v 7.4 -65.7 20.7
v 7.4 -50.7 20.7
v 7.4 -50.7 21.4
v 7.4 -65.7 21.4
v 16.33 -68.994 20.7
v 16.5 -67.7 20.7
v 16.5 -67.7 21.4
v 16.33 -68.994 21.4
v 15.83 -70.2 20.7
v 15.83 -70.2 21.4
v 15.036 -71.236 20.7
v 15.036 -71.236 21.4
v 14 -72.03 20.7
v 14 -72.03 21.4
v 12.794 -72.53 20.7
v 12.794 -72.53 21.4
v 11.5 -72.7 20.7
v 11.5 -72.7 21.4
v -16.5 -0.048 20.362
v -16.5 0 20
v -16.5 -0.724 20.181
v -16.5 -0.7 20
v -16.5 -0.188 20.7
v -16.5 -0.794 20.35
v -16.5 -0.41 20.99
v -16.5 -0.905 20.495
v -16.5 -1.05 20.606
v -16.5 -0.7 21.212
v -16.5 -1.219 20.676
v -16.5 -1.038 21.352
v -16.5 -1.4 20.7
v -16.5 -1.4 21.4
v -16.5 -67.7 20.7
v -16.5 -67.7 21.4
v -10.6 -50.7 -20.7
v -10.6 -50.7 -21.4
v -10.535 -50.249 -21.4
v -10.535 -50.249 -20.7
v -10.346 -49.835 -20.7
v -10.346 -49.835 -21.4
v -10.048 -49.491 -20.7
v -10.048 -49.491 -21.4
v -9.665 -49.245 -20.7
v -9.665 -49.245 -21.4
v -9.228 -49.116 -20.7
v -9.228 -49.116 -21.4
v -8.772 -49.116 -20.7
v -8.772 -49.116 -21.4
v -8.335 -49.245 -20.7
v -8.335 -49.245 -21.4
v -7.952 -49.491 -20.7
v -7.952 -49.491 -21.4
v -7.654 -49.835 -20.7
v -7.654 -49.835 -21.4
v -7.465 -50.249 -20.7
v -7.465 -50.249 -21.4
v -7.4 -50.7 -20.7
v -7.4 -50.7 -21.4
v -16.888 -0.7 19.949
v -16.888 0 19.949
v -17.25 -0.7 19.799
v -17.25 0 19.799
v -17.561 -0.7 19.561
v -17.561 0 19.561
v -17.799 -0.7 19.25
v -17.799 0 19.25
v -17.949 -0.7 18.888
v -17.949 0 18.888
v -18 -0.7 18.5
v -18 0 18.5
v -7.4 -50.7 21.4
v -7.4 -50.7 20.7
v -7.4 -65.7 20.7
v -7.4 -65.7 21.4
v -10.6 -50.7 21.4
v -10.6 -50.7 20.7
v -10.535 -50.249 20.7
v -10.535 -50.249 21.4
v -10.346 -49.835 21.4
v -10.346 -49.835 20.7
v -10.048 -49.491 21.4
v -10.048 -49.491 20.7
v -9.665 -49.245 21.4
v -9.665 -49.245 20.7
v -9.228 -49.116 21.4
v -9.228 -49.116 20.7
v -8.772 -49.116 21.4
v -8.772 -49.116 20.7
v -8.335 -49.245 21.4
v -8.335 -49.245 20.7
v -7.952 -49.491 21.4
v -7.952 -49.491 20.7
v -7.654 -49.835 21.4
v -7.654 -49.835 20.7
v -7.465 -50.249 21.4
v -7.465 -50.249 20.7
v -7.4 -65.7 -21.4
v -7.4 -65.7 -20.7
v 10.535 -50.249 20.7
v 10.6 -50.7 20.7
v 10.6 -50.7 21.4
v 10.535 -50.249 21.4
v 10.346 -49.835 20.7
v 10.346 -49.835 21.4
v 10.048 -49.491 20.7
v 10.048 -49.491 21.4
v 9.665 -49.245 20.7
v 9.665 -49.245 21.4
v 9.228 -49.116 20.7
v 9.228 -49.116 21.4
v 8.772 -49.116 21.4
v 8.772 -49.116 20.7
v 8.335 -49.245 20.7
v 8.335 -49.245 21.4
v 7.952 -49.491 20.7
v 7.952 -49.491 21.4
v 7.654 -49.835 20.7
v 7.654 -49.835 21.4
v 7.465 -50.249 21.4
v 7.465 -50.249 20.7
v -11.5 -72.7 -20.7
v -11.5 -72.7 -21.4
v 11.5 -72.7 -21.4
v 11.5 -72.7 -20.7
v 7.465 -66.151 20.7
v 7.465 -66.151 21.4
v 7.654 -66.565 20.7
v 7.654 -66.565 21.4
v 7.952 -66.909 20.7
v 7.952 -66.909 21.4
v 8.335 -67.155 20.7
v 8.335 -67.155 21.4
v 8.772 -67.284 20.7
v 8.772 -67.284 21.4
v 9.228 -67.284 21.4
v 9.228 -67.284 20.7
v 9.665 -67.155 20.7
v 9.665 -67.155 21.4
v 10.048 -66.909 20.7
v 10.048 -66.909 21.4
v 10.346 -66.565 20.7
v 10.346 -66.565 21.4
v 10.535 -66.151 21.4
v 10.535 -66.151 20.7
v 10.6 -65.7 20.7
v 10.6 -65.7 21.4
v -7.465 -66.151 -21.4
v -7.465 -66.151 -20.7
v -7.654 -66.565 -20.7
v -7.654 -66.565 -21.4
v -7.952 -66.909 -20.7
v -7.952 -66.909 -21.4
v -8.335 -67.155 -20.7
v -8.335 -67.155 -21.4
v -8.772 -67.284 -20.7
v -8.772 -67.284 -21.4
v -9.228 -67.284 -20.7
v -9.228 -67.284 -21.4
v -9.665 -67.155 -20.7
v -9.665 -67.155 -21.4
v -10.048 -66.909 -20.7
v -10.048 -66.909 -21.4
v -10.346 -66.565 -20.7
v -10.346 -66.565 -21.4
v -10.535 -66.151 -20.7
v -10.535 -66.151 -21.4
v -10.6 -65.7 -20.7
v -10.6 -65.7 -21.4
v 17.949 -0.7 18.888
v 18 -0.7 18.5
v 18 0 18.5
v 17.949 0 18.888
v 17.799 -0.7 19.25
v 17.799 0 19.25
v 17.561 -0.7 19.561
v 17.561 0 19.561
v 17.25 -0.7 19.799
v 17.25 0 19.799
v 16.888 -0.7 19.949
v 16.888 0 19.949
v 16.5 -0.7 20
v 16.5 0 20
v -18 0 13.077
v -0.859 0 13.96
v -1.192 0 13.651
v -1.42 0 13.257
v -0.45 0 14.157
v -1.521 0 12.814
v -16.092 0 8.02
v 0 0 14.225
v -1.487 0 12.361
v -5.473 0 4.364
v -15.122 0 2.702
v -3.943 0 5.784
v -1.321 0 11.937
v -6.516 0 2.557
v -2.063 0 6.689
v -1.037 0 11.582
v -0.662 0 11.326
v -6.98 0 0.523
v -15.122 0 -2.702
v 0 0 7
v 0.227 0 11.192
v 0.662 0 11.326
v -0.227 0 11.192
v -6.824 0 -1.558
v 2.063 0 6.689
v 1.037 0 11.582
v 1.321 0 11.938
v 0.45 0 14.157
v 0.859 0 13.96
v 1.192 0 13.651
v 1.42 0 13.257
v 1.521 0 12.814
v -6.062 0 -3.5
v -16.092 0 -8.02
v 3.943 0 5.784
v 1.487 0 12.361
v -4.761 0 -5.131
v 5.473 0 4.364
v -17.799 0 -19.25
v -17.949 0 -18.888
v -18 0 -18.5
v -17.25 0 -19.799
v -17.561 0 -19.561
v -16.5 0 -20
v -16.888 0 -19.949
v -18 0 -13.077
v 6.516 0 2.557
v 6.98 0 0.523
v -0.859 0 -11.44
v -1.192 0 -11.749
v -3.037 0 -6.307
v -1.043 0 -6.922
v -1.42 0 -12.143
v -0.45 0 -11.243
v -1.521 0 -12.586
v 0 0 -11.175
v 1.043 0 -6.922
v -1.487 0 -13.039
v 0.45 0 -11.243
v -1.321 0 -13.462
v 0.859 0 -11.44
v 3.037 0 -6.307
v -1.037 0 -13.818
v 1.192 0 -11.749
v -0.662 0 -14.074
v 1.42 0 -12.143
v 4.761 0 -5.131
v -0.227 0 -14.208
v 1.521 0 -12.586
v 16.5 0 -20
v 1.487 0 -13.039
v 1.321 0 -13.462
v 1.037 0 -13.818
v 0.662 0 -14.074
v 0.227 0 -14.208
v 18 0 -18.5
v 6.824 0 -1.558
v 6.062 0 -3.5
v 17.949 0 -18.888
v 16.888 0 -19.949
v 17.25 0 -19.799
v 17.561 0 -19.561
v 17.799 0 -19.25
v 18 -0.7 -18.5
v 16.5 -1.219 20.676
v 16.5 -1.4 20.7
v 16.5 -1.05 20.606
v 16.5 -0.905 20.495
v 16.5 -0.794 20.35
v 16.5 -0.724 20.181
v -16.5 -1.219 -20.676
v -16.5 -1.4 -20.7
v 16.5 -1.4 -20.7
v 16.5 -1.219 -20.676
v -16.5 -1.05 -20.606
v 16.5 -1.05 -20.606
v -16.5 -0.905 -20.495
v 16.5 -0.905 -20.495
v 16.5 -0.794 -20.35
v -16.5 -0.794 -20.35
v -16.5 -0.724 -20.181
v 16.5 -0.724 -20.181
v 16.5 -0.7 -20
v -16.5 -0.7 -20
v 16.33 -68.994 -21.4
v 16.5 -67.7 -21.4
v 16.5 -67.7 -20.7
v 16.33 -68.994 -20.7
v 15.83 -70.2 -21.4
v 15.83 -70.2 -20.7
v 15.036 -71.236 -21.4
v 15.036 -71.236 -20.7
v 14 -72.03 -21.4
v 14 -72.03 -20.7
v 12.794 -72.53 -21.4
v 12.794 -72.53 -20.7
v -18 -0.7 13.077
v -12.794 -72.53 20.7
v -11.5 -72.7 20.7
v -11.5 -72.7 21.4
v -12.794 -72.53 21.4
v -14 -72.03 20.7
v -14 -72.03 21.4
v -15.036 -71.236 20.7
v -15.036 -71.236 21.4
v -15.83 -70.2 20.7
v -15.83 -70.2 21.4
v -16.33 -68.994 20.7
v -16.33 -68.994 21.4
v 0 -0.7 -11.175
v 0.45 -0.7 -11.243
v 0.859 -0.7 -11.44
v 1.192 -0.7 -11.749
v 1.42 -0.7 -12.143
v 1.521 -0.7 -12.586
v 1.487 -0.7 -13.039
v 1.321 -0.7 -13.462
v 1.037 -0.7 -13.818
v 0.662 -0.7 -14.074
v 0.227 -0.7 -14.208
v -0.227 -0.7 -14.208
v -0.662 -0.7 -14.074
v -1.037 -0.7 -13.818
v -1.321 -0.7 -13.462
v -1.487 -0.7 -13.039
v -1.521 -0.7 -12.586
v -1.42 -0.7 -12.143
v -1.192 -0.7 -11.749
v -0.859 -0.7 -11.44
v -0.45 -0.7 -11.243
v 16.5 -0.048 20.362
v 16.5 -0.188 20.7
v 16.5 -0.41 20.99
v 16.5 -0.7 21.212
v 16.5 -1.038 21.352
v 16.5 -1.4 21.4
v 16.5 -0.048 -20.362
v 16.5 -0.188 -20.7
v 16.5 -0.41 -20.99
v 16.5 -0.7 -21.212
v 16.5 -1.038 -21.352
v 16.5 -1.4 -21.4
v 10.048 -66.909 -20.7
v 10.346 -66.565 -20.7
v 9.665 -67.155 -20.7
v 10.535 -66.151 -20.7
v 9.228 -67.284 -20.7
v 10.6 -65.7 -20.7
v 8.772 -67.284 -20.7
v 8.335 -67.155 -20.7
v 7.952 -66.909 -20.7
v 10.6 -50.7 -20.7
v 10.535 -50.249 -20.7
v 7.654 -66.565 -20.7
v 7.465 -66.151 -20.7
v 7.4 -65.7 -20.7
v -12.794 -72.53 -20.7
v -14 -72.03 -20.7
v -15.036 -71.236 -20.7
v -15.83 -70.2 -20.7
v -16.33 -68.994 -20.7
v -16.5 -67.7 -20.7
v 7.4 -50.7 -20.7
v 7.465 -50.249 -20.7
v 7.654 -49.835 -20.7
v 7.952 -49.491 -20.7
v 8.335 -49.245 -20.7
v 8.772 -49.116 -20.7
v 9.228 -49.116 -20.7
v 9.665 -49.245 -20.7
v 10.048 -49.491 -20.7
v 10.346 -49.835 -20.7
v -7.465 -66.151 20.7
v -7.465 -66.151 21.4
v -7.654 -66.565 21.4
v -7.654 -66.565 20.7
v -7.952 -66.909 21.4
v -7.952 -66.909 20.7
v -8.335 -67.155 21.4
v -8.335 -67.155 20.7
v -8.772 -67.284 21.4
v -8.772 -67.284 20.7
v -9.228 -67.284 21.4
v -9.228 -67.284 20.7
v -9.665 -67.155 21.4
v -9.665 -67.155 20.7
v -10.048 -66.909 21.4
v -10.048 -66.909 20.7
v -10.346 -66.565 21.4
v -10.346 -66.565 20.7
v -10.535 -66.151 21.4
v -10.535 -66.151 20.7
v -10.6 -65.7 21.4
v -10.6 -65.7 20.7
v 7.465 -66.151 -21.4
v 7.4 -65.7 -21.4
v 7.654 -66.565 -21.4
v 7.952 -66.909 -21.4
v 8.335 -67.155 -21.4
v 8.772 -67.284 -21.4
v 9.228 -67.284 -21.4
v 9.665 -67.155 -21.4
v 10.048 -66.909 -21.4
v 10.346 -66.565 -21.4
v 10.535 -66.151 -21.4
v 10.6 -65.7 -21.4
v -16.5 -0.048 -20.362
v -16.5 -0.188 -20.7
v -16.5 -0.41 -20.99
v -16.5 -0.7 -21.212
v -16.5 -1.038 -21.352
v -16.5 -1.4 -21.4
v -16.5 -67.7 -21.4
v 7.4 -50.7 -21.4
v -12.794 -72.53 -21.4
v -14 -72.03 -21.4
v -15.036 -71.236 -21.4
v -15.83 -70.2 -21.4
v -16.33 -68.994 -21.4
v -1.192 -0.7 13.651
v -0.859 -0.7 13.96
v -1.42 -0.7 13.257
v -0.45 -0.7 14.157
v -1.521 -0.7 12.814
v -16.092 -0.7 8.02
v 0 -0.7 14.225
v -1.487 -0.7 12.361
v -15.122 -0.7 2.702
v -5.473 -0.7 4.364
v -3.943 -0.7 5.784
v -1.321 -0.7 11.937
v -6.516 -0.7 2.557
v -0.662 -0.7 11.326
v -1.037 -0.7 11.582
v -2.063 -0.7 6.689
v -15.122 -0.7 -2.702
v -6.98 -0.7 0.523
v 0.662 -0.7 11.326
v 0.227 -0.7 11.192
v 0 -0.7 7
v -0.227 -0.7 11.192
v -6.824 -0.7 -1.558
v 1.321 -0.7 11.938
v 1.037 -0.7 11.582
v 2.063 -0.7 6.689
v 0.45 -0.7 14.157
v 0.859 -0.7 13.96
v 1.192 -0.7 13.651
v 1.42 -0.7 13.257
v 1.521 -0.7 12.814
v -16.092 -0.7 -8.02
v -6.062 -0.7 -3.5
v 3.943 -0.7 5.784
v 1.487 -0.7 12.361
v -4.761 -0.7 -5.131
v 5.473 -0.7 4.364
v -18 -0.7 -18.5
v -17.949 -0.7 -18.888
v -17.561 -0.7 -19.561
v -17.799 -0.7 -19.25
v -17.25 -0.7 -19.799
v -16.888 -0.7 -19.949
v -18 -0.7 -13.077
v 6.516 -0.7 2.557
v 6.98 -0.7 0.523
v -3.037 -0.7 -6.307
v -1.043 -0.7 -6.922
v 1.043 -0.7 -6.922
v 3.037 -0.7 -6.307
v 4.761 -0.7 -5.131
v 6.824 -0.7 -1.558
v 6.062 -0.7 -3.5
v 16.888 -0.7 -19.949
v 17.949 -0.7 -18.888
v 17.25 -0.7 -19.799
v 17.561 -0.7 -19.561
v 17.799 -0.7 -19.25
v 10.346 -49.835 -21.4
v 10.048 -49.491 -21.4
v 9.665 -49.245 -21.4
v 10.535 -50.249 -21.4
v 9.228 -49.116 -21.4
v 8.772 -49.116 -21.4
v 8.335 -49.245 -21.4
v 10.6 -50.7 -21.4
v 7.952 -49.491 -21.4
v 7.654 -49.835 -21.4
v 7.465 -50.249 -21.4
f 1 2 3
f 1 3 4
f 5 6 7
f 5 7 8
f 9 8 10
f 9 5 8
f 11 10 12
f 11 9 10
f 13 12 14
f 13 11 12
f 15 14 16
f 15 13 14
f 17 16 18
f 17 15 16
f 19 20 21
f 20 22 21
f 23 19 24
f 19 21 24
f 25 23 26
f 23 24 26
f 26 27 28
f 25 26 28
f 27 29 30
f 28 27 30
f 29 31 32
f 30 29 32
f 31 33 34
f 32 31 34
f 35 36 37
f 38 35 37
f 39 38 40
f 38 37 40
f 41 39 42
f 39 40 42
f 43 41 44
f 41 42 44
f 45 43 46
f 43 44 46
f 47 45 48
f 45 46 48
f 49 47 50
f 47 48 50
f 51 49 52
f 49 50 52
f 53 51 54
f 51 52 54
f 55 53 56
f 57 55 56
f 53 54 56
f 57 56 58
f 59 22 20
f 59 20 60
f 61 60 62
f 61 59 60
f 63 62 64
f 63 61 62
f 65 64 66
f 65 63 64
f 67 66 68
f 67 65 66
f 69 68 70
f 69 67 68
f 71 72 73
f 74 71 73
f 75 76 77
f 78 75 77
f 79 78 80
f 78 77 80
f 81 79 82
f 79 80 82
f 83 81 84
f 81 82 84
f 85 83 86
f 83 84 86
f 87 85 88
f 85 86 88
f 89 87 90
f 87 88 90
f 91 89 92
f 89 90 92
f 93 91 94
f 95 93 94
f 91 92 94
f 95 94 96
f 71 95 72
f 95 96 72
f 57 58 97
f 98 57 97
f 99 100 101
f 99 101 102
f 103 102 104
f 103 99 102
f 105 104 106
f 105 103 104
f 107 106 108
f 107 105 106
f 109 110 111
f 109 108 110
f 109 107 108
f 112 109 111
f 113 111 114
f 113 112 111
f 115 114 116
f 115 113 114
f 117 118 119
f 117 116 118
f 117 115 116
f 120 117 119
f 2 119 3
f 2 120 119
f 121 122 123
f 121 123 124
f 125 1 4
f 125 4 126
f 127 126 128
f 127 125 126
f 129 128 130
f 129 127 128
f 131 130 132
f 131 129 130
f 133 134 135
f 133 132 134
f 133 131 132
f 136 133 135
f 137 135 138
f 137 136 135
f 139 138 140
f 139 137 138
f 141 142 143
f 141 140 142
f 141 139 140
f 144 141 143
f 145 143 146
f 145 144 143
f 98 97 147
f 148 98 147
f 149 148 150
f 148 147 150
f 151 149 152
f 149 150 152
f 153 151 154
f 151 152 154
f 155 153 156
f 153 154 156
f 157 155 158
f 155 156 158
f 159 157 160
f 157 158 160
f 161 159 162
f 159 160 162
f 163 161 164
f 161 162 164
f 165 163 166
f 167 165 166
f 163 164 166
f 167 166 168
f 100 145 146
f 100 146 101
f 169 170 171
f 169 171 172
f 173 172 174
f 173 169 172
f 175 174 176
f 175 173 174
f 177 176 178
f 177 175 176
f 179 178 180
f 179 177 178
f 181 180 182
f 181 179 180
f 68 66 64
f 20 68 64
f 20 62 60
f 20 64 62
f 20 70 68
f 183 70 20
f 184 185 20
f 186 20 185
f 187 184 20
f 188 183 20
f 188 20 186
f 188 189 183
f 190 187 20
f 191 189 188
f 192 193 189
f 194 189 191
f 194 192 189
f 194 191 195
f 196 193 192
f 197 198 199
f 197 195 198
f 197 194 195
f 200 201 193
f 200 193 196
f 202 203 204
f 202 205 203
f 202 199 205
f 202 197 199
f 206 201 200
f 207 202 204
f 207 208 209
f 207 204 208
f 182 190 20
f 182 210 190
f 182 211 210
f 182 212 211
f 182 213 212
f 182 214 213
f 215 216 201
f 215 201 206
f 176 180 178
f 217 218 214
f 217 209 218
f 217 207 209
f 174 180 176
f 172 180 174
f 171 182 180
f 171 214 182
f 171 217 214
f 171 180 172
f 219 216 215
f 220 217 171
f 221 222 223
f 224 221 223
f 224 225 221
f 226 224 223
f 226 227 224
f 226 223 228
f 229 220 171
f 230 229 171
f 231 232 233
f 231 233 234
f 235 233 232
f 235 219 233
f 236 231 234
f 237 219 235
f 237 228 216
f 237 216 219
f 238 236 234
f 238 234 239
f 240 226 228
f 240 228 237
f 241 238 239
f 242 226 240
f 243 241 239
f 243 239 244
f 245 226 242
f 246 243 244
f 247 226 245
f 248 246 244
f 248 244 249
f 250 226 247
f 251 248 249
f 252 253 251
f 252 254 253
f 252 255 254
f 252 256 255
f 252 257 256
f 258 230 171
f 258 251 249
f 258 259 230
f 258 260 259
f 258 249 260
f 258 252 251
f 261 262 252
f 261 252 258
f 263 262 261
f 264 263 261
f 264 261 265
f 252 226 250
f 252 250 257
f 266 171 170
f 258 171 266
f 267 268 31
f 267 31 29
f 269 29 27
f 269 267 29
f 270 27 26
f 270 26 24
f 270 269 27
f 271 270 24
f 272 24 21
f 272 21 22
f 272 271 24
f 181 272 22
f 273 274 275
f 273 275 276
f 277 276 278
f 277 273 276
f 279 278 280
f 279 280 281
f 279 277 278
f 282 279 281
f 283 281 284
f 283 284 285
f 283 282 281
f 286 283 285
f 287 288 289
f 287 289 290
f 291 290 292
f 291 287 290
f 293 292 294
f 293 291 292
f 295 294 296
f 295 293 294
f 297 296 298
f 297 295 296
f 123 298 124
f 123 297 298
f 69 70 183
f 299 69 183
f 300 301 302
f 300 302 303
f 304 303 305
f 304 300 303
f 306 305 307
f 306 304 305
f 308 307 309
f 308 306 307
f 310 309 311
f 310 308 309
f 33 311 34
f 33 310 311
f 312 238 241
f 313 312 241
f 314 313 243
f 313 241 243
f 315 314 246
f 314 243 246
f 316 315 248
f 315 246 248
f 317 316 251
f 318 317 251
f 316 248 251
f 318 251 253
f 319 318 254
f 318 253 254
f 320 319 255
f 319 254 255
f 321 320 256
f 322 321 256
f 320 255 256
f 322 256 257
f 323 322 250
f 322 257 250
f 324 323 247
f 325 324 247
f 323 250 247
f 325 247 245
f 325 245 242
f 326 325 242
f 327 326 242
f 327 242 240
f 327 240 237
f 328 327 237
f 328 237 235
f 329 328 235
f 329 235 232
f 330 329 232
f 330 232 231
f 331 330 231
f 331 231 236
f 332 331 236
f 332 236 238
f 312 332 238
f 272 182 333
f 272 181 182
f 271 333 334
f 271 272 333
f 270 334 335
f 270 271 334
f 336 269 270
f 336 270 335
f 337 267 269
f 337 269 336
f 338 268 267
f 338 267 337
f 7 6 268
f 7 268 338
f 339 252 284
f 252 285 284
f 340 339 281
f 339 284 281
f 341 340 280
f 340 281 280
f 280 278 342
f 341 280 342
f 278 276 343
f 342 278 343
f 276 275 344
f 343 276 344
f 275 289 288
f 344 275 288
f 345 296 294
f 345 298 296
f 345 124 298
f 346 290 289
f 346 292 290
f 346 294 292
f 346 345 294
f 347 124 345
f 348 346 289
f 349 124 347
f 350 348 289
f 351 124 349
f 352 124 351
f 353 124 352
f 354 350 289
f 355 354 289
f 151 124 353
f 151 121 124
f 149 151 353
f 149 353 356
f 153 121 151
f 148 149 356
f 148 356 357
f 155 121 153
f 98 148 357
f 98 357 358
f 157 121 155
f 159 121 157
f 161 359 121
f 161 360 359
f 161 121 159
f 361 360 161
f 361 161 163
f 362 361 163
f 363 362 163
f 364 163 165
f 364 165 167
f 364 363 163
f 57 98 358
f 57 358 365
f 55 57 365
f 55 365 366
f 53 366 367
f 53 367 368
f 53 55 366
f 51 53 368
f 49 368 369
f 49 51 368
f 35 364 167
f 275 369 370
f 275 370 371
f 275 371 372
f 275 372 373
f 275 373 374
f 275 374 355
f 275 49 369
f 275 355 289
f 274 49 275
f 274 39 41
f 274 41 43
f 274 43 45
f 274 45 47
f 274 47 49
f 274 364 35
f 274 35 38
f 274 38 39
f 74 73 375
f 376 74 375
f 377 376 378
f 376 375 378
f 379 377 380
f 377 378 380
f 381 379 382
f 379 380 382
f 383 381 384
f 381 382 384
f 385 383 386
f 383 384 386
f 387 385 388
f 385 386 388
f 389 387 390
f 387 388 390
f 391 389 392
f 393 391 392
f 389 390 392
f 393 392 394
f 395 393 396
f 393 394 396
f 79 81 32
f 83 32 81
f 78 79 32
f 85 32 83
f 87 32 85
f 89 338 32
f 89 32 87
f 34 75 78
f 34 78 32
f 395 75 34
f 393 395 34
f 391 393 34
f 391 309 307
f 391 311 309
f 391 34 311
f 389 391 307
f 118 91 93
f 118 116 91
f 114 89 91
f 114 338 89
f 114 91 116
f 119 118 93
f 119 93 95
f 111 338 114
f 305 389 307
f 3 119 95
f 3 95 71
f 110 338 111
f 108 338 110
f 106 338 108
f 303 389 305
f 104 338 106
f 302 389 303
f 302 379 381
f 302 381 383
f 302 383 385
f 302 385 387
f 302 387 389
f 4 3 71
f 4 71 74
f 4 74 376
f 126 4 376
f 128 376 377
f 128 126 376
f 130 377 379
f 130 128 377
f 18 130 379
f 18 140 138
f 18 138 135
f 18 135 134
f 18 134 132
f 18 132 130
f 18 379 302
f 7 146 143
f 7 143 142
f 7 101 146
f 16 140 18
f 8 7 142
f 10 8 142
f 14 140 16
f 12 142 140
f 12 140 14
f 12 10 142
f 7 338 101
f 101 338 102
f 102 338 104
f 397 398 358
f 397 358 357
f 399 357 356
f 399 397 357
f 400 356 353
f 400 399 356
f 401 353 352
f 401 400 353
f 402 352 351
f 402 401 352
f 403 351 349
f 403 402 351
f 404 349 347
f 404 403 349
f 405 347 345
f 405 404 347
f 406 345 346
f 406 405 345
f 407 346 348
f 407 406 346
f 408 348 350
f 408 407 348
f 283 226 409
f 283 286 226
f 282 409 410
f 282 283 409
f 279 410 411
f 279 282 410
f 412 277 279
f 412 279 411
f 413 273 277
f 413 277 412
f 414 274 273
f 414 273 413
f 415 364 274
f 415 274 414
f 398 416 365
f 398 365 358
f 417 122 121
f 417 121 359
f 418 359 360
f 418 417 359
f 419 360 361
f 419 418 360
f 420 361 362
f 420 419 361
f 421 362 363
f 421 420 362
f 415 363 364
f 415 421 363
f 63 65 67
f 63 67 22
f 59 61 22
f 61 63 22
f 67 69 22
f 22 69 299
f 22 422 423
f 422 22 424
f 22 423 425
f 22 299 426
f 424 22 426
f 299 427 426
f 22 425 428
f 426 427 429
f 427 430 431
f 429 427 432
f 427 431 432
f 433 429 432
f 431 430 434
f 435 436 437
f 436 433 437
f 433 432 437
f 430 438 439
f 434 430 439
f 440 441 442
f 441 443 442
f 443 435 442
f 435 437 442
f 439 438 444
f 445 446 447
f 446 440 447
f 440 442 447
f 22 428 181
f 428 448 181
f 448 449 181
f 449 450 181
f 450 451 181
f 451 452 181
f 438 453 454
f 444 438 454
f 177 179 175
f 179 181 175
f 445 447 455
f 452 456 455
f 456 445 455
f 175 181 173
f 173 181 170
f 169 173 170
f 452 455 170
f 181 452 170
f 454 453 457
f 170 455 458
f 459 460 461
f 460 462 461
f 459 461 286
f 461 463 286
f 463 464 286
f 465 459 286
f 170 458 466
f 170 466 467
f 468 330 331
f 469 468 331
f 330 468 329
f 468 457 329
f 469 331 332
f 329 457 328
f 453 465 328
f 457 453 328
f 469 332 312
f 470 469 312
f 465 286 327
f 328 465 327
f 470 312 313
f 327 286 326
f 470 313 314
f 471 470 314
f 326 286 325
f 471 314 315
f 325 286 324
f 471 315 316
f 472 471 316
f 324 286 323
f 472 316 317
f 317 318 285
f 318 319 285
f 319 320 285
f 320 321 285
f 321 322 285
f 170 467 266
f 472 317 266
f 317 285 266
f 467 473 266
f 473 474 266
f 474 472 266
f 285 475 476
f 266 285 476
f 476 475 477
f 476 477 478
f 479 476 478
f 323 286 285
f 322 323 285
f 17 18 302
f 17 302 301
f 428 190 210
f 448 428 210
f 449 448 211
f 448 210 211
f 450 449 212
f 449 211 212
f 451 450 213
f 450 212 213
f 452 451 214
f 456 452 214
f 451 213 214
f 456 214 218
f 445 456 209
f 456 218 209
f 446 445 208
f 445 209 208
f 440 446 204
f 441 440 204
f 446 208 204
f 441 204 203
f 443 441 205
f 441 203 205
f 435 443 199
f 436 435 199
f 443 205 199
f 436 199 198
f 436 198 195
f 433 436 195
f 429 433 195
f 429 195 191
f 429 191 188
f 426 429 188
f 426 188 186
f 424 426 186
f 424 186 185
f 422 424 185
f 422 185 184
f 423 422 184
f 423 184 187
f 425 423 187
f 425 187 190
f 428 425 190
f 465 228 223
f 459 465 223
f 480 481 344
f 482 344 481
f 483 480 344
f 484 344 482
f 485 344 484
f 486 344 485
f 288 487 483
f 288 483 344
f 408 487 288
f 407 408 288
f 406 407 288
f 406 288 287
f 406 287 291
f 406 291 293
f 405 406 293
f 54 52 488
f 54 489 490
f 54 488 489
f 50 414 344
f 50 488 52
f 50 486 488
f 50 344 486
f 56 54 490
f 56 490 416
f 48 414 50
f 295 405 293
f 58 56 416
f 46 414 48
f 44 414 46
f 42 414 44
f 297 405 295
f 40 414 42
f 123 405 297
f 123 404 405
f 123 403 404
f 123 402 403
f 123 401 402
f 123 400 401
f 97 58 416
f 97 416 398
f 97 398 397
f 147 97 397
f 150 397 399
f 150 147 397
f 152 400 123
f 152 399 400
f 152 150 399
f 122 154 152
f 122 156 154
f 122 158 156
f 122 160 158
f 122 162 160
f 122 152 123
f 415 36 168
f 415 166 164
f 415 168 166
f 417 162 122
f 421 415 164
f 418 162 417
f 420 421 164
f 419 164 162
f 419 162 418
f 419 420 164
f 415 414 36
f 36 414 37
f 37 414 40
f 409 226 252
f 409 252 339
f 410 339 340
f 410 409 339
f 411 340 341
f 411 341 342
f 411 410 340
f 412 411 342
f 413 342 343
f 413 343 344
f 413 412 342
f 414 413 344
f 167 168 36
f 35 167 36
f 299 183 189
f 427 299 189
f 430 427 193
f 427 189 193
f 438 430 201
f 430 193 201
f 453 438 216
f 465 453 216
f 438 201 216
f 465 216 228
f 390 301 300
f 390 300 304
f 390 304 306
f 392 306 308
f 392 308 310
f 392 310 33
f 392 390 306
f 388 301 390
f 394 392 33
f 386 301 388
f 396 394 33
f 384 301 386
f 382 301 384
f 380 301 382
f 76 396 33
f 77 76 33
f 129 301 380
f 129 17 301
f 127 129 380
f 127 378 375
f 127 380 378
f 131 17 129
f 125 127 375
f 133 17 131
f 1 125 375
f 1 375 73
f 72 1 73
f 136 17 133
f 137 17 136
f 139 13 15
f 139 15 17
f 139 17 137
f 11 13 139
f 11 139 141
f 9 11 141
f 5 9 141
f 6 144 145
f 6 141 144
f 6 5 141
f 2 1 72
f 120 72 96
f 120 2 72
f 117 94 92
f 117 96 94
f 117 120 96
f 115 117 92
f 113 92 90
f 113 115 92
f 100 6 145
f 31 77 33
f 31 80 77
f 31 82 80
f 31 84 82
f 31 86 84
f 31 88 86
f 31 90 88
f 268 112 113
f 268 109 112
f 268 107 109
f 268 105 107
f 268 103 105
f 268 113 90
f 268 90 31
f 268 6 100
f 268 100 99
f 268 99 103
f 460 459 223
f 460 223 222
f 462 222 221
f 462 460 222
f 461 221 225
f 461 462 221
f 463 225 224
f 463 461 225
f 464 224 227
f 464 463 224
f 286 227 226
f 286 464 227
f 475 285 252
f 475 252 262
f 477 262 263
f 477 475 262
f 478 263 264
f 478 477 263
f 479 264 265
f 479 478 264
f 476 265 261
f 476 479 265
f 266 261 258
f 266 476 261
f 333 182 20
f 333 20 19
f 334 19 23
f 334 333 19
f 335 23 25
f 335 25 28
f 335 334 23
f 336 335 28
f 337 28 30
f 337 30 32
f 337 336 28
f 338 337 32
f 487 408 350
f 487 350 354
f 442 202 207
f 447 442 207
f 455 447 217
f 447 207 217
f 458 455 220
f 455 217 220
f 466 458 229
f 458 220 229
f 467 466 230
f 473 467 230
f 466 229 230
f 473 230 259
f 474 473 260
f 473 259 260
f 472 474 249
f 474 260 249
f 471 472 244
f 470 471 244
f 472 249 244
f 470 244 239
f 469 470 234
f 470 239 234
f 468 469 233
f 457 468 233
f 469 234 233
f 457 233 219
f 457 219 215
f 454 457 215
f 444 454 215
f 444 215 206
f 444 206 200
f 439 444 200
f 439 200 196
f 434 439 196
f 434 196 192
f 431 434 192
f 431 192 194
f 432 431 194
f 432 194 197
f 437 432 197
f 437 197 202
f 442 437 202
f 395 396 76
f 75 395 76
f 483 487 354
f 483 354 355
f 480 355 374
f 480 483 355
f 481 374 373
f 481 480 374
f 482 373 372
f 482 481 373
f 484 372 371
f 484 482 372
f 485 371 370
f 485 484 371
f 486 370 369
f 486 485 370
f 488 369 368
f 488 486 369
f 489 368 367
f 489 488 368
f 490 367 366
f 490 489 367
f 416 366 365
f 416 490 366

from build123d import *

# Parameters (mm, degrees)
SKETCH1_W               = 36
SKETCH1_H               = 40
BASE_FLANGE1_DEPTH      = 0.7
EDGE_FLANGE1_DEPTH      = 33
EDGE_FLANGE1_BEND_DEPTH = 33
BREAK_CORNER1_START     = -0.7
BREAK_CORNER1_DEPTH     = 0.7
BREAK_CORNER2_START     = -21.4
BREAK_CORNER2_DEPTH     = 42.8
CUT_EXTRUDE1_DEPTH      = 78.892554201
CUT_EXTRUDE1_DEPTH_BACK = 78.892554201
CUT_EXTRUDE2_REACH      = 79.893
SKETCH11_R              = 7
SKETCH11_R_2            = 1.525
CUT_EXTRUDE3_REACH      = 79.893
SKETCH12_R              = 30


# Read off the part's stored shape, not the designer's step: Break-Corner1, Break-Corner2
# Sheet-metal steps are written as plain solids
with BuildPart() as part:
    # Sketch1 → Base-Flange1 (new body)
    with BuildSketch(Plane(origin=(0, 0, 0), x_dir=(1, 0, 0), z_dir=(0, 1, 0))):
        Rectangle(SKETCH1_W, SKETCH1_H)
    extrude(amount=-BASE_FLANGE1_DEPTH)

    # Edge-Flange1 section (across the edge) → Edge-Flange1 (add)
    with BuildSketch(Plane(origin=(16.5, -0.7, 20.7), x_dir=(0, 0, -1), z_dir=(-1, 0, 0))):
        with BuildLine():
            Line((-0.7, 0.7), (-0.7, 72))
            Line((-0.7, 72), (0, 72))
            Line((0, 72), (0, 0.7))
            ThreePointArc((0, 0.7), (0.205025253, 0.205025253), (0.7, 0))
            Line((0.7, 0), (0.7, -0.7))
            ThreePointArc((0.7, -0.7), (-0.289949494, -0.289949494), (-0.7, 0.7))
        make_face()
    extrude(amount=EDGE_FLANGE1_DEPTH)

    # Edge-Flange1 section 2 (across the edge) → Edge-Flange1 bend (add)
    with BuildSketch(Plane(origin=(-16.5, -0.7, -20.7), x_dir=(0, 0, 1), z_dir=(1, 0, 0))):
        with BuildLine():
            Line((-0.7, 0.7), (-0.7, 72))
            Line((-0.7, 72), (0, 72))
            Line((0, 72), (0, 0.7))
            ThreePointArc((0, 0.7), (0.205025253, 0.205025253), (0.7, 0))
            Line((0.7, 0), (0.7, -0.7))
            ThreePointArc((0.7, -0.7), (-0.289949494, -0.289949494), (-0.7, 0.7))
        make_face()
    extrude(amount=EDGE_FLANGE1_BEND_DEPTH)

    # Break-Corner1 outline → Break-Corner1 (cut)
    with BuildSketch(Plane(origin=(0, 0, 0), x_dir=(1, 0, 0), z_dir=(0, 1, 0)).offset(BREAK_CORNER1_START)):
        with BuildLine():
            Line((18, -20), (18, -18.5001))
            ThreePointArc((18, -18.5001), (17.560689461, -19.560689461), (16.5001, -20))
            Line((16.5001, -20), (18, -20))
        make_face()
        with BuildLine():
            ThreePointArc((16.5001, 20), (17.560689461, 19.560689461), (18, 18.5001))
            Line((18, 18.5001), (18, 20))
            Line((18, 20), (16.5001, 20))
        make_face()
        with BuildLine():
            ThreePointArc((-16.5001, -20), (-17.560689461, -19.560689461), (-18, -18.5001))
            Line((-18, -18.5001), (-18, -20))
            Line((-18, -20), (-16.5001, -20))
        make_face()
        with BuildLine():
            ThreePointArc((-18, 18.5001), (-17.560689461, 19.560689461), (-16.5001, 20))
            Line((-16.5001, 20), (-18, 20))
            Line((-18, 20), (-18, 18.5001))
        make_face()
    extrude(amount=BREAK_CORNER1_DEPTH, mode=Mode.SUBTRACT)

    # Break-Corner2 outline → Break-Corner2 (cut)
    with BuildSketch(Plane.XY.offset(BREAK_CORNER2_START)):
        with BuildLine():
            ThreePointArc((16.5, -67.7), (15.035533906, -71.235533906), (11.5, -72.7))
            Line((11.5, -72.7), (16.5, -72.7))
            Line((16.5, -72.7), (16.5, -67.7))
        make_face()
        with BuildLine():
            Line((-16.5, -72.7), (-11.5, -72.7))
            ThreePointArc((-11.5, -72.7), (-15.035533906, -71.235533906), (-16.5, -67.7))
            Line((-16.5, -67.7), (-16.5, -72.7))
        make_face()
    extrude(amount=BREAK_CORNER2_DEPTH, mode=Mode.SUBTRACT)

    # Sketch10 → Cut-Extrude1 (cut, two sides: drawn at the far end of the back side and taken through both)
    with BuildSketch(Plane.XY.offset(-CUT_EXTRUDE1_DEPTH_BACK)):
        with BuildLine():
            Line((-7.4, -50.7), (-7.4, -65.7))
            ThreePointArc((-7.4, -65.7), (-9, -67.3), (-10.6, -65.7))
            Line((-10.6, -65.7), (-10.6, -50.7))
            ThreePointArc((-10.6, -50.7), (-9, -49.1), (-7.4, -50.7))
        make_face()
        with BuildLine():
            Line((7.4, -50.7), (7.4, -65.7))
            ThreePointArc((7.4, -65.7), (9, -67.3), (10.6, -65.7))
            Line((10.6, -65.7), (10.6, -50.7))
            ThreePointArc((10.6, -50.7), (9, -49.1), (7.4, -50.7))
        make_face()
    extrude(amount=CUT_EXTRUDE1_DEPTH + CUT_EXTRUDE1_DEPTH_BACK, mode=Mode.SUBTRACT)

    # Sketch11 → Cut-Extrude2 (cut, up to next)
    with BuildSketch(Plane(origin=(0, 0, 0), x_dir=(1, 0, 0), z_dir=(0, 1, 0)), mode=Mode.PRIVATE) as cut_extrude2_sk1:
        with Locations(Location((0, 0, 0), (0, 0, 270))):
            Circle(SKETCH11_R)
    cut_extrude2_tool1 = extrude(cut_extrude2_sk1.sketch, amount=-CUT_EXTRUDE2_REACH, mode=Mode.PRIVATE) & part.part
    # Sketch11 → Cut-Extrude2 (cut, up to next)
    with BuildSketch(Plane(origin=(0, 0, 0), x_dir=(1, 0, 0), z_dir=(0, 1, 0)), mode=Mode.PRIVATE) as cut_extrude2_sk2:
        with Locations(Location((0, -12.7, 0), (0, 0, 270))):
            Circle(SKETCH11_R_2)
    cut_extrude2_tool2 = extrude(cut_extrude2_sk2.sketch, amount=-CUT_EXTRUDE2_REACH, mode=Mode.PRIVATE) & part.part
    # Sketch11 → Cut-Extrude2 (cut, up to next)
    with BuildSketch(Plane(origin=(0, 0, 0), x_dir=(1, 0, 0), z_dir=(0, 1, 0)), mode=Mode.PRIVATE) as cut_extrude2_sk3:
        with Locations(Location((0, 12.7, 0), (0, 0, 270))):
            Circle(SKETCH11_R_2)
    cut_extrude2_tool3 = extrude(cut_extrude2_sk3.sketch, amount=-CUT_EXTRUDE2_REACH, mode=Mode.PRIVATE) & part.part
    add(cut_extrude2_tool1.solids().sort_by_distance((0, 0, 0))[0], mode=Mode.SUBTRACT)
    add(cut_extrude2_tool2.solids().sort_by_distance((0, 0, 12.7))[0], mode=Mode.SUBTRACT)
    add(cut_extrude2_tool3.solids().sort_by_distance((0, 0, -12.7))[0], mode=Mode.SUBTRACT)

    # Sketch12 → Cut-Extrude3 (cut, up to next)
    with BuildSketch(Plane(origin=(0, 0, 0), x_dir=(1, 0, 0), z_dir=(0, 1, 0)), mode=Mode.PRIVATE) as cut_extrude3_sk1:
        with Locations((-45, 0)):
            Circle(SKETCH12_R)
    cut_extrude3_tool1 = extrude(cut_extrude3_sk1.sketch, amount=-CUT_EXTRUDE3_REACH, mode=Mode.PRIVATE) & part.part
    add(cut_extrude3_tool1.solids().sort_by_distance((-45, 0, 0))[0], mode=Mode.SUBTRACT)


solid = part.part
